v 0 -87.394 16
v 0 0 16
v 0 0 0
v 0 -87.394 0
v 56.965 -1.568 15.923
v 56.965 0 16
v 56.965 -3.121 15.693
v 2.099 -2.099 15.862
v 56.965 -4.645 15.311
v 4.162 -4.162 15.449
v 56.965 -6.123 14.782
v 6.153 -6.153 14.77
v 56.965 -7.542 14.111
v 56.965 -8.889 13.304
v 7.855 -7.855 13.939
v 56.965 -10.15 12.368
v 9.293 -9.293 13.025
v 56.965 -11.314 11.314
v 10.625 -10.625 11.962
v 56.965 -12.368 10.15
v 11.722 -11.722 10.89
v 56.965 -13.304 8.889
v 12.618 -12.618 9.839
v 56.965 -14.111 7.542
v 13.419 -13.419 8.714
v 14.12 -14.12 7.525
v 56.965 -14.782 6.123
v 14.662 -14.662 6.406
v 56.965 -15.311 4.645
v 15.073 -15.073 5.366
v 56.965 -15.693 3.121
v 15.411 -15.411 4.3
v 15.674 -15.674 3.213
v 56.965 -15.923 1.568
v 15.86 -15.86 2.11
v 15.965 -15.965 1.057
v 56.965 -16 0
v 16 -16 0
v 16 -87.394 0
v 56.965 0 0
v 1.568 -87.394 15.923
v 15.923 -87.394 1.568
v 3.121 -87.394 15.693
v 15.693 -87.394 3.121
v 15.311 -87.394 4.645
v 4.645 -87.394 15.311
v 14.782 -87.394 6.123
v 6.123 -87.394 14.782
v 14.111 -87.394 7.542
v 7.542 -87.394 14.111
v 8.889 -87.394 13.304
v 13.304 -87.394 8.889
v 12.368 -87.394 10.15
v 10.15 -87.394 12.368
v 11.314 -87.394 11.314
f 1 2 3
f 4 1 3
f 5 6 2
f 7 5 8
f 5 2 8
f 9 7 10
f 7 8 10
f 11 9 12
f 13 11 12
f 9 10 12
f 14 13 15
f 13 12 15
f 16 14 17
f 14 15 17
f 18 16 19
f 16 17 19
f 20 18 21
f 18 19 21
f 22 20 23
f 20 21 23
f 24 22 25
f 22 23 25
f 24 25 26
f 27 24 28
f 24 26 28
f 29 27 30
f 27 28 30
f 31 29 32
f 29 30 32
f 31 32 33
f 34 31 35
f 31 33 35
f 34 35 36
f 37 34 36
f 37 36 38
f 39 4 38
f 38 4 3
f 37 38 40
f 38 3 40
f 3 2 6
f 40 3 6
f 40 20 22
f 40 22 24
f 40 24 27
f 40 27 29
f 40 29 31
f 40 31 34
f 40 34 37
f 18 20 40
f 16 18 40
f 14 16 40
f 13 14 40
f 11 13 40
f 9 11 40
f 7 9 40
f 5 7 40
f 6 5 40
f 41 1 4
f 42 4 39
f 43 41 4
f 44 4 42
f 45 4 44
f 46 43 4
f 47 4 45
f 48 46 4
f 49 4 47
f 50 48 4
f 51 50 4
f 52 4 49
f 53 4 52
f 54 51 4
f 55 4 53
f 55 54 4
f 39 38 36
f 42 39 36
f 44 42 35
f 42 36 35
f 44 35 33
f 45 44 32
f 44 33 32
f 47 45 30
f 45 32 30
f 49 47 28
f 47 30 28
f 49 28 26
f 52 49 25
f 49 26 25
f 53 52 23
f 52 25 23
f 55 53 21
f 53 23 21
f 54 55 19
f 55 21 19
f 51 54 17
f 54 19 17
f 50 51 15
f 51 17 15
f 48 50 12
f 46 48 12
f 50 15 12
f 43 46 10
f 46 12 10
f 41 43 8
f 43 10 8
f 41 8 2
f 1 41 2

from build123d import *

# Parameters (mm, degrees)
F1_DEPTH = 87.394075
F3_DEPTH = 56.96498


with BuildPart() as f1:
    # F0 (on Front) → F1 (new body)
    with BuildSketch(Plane.XZ):
        with BuildLine():
            ThreePointArc((16, 0), (11.313708, 11.313708), (0, 16))
            Line((0, 16), (0, 0))
            Line((0, 0), (16, 0))
        make_face()
    extrude(amount=F1_DEPTH)

    # F2 (on Right) → F3 (join)
    with BuildSketch(Plane.YZ):
        with BuildLine():
            Line((-16, 0), (0, 0))
            Line((0, 0), (0, 16))
            ThreePointArc((0, 16), (-11.313708, 11.313708), (-16, 0))
        make_face()
    extrude(amount=F3_DEPTH)


solid = f1.part
